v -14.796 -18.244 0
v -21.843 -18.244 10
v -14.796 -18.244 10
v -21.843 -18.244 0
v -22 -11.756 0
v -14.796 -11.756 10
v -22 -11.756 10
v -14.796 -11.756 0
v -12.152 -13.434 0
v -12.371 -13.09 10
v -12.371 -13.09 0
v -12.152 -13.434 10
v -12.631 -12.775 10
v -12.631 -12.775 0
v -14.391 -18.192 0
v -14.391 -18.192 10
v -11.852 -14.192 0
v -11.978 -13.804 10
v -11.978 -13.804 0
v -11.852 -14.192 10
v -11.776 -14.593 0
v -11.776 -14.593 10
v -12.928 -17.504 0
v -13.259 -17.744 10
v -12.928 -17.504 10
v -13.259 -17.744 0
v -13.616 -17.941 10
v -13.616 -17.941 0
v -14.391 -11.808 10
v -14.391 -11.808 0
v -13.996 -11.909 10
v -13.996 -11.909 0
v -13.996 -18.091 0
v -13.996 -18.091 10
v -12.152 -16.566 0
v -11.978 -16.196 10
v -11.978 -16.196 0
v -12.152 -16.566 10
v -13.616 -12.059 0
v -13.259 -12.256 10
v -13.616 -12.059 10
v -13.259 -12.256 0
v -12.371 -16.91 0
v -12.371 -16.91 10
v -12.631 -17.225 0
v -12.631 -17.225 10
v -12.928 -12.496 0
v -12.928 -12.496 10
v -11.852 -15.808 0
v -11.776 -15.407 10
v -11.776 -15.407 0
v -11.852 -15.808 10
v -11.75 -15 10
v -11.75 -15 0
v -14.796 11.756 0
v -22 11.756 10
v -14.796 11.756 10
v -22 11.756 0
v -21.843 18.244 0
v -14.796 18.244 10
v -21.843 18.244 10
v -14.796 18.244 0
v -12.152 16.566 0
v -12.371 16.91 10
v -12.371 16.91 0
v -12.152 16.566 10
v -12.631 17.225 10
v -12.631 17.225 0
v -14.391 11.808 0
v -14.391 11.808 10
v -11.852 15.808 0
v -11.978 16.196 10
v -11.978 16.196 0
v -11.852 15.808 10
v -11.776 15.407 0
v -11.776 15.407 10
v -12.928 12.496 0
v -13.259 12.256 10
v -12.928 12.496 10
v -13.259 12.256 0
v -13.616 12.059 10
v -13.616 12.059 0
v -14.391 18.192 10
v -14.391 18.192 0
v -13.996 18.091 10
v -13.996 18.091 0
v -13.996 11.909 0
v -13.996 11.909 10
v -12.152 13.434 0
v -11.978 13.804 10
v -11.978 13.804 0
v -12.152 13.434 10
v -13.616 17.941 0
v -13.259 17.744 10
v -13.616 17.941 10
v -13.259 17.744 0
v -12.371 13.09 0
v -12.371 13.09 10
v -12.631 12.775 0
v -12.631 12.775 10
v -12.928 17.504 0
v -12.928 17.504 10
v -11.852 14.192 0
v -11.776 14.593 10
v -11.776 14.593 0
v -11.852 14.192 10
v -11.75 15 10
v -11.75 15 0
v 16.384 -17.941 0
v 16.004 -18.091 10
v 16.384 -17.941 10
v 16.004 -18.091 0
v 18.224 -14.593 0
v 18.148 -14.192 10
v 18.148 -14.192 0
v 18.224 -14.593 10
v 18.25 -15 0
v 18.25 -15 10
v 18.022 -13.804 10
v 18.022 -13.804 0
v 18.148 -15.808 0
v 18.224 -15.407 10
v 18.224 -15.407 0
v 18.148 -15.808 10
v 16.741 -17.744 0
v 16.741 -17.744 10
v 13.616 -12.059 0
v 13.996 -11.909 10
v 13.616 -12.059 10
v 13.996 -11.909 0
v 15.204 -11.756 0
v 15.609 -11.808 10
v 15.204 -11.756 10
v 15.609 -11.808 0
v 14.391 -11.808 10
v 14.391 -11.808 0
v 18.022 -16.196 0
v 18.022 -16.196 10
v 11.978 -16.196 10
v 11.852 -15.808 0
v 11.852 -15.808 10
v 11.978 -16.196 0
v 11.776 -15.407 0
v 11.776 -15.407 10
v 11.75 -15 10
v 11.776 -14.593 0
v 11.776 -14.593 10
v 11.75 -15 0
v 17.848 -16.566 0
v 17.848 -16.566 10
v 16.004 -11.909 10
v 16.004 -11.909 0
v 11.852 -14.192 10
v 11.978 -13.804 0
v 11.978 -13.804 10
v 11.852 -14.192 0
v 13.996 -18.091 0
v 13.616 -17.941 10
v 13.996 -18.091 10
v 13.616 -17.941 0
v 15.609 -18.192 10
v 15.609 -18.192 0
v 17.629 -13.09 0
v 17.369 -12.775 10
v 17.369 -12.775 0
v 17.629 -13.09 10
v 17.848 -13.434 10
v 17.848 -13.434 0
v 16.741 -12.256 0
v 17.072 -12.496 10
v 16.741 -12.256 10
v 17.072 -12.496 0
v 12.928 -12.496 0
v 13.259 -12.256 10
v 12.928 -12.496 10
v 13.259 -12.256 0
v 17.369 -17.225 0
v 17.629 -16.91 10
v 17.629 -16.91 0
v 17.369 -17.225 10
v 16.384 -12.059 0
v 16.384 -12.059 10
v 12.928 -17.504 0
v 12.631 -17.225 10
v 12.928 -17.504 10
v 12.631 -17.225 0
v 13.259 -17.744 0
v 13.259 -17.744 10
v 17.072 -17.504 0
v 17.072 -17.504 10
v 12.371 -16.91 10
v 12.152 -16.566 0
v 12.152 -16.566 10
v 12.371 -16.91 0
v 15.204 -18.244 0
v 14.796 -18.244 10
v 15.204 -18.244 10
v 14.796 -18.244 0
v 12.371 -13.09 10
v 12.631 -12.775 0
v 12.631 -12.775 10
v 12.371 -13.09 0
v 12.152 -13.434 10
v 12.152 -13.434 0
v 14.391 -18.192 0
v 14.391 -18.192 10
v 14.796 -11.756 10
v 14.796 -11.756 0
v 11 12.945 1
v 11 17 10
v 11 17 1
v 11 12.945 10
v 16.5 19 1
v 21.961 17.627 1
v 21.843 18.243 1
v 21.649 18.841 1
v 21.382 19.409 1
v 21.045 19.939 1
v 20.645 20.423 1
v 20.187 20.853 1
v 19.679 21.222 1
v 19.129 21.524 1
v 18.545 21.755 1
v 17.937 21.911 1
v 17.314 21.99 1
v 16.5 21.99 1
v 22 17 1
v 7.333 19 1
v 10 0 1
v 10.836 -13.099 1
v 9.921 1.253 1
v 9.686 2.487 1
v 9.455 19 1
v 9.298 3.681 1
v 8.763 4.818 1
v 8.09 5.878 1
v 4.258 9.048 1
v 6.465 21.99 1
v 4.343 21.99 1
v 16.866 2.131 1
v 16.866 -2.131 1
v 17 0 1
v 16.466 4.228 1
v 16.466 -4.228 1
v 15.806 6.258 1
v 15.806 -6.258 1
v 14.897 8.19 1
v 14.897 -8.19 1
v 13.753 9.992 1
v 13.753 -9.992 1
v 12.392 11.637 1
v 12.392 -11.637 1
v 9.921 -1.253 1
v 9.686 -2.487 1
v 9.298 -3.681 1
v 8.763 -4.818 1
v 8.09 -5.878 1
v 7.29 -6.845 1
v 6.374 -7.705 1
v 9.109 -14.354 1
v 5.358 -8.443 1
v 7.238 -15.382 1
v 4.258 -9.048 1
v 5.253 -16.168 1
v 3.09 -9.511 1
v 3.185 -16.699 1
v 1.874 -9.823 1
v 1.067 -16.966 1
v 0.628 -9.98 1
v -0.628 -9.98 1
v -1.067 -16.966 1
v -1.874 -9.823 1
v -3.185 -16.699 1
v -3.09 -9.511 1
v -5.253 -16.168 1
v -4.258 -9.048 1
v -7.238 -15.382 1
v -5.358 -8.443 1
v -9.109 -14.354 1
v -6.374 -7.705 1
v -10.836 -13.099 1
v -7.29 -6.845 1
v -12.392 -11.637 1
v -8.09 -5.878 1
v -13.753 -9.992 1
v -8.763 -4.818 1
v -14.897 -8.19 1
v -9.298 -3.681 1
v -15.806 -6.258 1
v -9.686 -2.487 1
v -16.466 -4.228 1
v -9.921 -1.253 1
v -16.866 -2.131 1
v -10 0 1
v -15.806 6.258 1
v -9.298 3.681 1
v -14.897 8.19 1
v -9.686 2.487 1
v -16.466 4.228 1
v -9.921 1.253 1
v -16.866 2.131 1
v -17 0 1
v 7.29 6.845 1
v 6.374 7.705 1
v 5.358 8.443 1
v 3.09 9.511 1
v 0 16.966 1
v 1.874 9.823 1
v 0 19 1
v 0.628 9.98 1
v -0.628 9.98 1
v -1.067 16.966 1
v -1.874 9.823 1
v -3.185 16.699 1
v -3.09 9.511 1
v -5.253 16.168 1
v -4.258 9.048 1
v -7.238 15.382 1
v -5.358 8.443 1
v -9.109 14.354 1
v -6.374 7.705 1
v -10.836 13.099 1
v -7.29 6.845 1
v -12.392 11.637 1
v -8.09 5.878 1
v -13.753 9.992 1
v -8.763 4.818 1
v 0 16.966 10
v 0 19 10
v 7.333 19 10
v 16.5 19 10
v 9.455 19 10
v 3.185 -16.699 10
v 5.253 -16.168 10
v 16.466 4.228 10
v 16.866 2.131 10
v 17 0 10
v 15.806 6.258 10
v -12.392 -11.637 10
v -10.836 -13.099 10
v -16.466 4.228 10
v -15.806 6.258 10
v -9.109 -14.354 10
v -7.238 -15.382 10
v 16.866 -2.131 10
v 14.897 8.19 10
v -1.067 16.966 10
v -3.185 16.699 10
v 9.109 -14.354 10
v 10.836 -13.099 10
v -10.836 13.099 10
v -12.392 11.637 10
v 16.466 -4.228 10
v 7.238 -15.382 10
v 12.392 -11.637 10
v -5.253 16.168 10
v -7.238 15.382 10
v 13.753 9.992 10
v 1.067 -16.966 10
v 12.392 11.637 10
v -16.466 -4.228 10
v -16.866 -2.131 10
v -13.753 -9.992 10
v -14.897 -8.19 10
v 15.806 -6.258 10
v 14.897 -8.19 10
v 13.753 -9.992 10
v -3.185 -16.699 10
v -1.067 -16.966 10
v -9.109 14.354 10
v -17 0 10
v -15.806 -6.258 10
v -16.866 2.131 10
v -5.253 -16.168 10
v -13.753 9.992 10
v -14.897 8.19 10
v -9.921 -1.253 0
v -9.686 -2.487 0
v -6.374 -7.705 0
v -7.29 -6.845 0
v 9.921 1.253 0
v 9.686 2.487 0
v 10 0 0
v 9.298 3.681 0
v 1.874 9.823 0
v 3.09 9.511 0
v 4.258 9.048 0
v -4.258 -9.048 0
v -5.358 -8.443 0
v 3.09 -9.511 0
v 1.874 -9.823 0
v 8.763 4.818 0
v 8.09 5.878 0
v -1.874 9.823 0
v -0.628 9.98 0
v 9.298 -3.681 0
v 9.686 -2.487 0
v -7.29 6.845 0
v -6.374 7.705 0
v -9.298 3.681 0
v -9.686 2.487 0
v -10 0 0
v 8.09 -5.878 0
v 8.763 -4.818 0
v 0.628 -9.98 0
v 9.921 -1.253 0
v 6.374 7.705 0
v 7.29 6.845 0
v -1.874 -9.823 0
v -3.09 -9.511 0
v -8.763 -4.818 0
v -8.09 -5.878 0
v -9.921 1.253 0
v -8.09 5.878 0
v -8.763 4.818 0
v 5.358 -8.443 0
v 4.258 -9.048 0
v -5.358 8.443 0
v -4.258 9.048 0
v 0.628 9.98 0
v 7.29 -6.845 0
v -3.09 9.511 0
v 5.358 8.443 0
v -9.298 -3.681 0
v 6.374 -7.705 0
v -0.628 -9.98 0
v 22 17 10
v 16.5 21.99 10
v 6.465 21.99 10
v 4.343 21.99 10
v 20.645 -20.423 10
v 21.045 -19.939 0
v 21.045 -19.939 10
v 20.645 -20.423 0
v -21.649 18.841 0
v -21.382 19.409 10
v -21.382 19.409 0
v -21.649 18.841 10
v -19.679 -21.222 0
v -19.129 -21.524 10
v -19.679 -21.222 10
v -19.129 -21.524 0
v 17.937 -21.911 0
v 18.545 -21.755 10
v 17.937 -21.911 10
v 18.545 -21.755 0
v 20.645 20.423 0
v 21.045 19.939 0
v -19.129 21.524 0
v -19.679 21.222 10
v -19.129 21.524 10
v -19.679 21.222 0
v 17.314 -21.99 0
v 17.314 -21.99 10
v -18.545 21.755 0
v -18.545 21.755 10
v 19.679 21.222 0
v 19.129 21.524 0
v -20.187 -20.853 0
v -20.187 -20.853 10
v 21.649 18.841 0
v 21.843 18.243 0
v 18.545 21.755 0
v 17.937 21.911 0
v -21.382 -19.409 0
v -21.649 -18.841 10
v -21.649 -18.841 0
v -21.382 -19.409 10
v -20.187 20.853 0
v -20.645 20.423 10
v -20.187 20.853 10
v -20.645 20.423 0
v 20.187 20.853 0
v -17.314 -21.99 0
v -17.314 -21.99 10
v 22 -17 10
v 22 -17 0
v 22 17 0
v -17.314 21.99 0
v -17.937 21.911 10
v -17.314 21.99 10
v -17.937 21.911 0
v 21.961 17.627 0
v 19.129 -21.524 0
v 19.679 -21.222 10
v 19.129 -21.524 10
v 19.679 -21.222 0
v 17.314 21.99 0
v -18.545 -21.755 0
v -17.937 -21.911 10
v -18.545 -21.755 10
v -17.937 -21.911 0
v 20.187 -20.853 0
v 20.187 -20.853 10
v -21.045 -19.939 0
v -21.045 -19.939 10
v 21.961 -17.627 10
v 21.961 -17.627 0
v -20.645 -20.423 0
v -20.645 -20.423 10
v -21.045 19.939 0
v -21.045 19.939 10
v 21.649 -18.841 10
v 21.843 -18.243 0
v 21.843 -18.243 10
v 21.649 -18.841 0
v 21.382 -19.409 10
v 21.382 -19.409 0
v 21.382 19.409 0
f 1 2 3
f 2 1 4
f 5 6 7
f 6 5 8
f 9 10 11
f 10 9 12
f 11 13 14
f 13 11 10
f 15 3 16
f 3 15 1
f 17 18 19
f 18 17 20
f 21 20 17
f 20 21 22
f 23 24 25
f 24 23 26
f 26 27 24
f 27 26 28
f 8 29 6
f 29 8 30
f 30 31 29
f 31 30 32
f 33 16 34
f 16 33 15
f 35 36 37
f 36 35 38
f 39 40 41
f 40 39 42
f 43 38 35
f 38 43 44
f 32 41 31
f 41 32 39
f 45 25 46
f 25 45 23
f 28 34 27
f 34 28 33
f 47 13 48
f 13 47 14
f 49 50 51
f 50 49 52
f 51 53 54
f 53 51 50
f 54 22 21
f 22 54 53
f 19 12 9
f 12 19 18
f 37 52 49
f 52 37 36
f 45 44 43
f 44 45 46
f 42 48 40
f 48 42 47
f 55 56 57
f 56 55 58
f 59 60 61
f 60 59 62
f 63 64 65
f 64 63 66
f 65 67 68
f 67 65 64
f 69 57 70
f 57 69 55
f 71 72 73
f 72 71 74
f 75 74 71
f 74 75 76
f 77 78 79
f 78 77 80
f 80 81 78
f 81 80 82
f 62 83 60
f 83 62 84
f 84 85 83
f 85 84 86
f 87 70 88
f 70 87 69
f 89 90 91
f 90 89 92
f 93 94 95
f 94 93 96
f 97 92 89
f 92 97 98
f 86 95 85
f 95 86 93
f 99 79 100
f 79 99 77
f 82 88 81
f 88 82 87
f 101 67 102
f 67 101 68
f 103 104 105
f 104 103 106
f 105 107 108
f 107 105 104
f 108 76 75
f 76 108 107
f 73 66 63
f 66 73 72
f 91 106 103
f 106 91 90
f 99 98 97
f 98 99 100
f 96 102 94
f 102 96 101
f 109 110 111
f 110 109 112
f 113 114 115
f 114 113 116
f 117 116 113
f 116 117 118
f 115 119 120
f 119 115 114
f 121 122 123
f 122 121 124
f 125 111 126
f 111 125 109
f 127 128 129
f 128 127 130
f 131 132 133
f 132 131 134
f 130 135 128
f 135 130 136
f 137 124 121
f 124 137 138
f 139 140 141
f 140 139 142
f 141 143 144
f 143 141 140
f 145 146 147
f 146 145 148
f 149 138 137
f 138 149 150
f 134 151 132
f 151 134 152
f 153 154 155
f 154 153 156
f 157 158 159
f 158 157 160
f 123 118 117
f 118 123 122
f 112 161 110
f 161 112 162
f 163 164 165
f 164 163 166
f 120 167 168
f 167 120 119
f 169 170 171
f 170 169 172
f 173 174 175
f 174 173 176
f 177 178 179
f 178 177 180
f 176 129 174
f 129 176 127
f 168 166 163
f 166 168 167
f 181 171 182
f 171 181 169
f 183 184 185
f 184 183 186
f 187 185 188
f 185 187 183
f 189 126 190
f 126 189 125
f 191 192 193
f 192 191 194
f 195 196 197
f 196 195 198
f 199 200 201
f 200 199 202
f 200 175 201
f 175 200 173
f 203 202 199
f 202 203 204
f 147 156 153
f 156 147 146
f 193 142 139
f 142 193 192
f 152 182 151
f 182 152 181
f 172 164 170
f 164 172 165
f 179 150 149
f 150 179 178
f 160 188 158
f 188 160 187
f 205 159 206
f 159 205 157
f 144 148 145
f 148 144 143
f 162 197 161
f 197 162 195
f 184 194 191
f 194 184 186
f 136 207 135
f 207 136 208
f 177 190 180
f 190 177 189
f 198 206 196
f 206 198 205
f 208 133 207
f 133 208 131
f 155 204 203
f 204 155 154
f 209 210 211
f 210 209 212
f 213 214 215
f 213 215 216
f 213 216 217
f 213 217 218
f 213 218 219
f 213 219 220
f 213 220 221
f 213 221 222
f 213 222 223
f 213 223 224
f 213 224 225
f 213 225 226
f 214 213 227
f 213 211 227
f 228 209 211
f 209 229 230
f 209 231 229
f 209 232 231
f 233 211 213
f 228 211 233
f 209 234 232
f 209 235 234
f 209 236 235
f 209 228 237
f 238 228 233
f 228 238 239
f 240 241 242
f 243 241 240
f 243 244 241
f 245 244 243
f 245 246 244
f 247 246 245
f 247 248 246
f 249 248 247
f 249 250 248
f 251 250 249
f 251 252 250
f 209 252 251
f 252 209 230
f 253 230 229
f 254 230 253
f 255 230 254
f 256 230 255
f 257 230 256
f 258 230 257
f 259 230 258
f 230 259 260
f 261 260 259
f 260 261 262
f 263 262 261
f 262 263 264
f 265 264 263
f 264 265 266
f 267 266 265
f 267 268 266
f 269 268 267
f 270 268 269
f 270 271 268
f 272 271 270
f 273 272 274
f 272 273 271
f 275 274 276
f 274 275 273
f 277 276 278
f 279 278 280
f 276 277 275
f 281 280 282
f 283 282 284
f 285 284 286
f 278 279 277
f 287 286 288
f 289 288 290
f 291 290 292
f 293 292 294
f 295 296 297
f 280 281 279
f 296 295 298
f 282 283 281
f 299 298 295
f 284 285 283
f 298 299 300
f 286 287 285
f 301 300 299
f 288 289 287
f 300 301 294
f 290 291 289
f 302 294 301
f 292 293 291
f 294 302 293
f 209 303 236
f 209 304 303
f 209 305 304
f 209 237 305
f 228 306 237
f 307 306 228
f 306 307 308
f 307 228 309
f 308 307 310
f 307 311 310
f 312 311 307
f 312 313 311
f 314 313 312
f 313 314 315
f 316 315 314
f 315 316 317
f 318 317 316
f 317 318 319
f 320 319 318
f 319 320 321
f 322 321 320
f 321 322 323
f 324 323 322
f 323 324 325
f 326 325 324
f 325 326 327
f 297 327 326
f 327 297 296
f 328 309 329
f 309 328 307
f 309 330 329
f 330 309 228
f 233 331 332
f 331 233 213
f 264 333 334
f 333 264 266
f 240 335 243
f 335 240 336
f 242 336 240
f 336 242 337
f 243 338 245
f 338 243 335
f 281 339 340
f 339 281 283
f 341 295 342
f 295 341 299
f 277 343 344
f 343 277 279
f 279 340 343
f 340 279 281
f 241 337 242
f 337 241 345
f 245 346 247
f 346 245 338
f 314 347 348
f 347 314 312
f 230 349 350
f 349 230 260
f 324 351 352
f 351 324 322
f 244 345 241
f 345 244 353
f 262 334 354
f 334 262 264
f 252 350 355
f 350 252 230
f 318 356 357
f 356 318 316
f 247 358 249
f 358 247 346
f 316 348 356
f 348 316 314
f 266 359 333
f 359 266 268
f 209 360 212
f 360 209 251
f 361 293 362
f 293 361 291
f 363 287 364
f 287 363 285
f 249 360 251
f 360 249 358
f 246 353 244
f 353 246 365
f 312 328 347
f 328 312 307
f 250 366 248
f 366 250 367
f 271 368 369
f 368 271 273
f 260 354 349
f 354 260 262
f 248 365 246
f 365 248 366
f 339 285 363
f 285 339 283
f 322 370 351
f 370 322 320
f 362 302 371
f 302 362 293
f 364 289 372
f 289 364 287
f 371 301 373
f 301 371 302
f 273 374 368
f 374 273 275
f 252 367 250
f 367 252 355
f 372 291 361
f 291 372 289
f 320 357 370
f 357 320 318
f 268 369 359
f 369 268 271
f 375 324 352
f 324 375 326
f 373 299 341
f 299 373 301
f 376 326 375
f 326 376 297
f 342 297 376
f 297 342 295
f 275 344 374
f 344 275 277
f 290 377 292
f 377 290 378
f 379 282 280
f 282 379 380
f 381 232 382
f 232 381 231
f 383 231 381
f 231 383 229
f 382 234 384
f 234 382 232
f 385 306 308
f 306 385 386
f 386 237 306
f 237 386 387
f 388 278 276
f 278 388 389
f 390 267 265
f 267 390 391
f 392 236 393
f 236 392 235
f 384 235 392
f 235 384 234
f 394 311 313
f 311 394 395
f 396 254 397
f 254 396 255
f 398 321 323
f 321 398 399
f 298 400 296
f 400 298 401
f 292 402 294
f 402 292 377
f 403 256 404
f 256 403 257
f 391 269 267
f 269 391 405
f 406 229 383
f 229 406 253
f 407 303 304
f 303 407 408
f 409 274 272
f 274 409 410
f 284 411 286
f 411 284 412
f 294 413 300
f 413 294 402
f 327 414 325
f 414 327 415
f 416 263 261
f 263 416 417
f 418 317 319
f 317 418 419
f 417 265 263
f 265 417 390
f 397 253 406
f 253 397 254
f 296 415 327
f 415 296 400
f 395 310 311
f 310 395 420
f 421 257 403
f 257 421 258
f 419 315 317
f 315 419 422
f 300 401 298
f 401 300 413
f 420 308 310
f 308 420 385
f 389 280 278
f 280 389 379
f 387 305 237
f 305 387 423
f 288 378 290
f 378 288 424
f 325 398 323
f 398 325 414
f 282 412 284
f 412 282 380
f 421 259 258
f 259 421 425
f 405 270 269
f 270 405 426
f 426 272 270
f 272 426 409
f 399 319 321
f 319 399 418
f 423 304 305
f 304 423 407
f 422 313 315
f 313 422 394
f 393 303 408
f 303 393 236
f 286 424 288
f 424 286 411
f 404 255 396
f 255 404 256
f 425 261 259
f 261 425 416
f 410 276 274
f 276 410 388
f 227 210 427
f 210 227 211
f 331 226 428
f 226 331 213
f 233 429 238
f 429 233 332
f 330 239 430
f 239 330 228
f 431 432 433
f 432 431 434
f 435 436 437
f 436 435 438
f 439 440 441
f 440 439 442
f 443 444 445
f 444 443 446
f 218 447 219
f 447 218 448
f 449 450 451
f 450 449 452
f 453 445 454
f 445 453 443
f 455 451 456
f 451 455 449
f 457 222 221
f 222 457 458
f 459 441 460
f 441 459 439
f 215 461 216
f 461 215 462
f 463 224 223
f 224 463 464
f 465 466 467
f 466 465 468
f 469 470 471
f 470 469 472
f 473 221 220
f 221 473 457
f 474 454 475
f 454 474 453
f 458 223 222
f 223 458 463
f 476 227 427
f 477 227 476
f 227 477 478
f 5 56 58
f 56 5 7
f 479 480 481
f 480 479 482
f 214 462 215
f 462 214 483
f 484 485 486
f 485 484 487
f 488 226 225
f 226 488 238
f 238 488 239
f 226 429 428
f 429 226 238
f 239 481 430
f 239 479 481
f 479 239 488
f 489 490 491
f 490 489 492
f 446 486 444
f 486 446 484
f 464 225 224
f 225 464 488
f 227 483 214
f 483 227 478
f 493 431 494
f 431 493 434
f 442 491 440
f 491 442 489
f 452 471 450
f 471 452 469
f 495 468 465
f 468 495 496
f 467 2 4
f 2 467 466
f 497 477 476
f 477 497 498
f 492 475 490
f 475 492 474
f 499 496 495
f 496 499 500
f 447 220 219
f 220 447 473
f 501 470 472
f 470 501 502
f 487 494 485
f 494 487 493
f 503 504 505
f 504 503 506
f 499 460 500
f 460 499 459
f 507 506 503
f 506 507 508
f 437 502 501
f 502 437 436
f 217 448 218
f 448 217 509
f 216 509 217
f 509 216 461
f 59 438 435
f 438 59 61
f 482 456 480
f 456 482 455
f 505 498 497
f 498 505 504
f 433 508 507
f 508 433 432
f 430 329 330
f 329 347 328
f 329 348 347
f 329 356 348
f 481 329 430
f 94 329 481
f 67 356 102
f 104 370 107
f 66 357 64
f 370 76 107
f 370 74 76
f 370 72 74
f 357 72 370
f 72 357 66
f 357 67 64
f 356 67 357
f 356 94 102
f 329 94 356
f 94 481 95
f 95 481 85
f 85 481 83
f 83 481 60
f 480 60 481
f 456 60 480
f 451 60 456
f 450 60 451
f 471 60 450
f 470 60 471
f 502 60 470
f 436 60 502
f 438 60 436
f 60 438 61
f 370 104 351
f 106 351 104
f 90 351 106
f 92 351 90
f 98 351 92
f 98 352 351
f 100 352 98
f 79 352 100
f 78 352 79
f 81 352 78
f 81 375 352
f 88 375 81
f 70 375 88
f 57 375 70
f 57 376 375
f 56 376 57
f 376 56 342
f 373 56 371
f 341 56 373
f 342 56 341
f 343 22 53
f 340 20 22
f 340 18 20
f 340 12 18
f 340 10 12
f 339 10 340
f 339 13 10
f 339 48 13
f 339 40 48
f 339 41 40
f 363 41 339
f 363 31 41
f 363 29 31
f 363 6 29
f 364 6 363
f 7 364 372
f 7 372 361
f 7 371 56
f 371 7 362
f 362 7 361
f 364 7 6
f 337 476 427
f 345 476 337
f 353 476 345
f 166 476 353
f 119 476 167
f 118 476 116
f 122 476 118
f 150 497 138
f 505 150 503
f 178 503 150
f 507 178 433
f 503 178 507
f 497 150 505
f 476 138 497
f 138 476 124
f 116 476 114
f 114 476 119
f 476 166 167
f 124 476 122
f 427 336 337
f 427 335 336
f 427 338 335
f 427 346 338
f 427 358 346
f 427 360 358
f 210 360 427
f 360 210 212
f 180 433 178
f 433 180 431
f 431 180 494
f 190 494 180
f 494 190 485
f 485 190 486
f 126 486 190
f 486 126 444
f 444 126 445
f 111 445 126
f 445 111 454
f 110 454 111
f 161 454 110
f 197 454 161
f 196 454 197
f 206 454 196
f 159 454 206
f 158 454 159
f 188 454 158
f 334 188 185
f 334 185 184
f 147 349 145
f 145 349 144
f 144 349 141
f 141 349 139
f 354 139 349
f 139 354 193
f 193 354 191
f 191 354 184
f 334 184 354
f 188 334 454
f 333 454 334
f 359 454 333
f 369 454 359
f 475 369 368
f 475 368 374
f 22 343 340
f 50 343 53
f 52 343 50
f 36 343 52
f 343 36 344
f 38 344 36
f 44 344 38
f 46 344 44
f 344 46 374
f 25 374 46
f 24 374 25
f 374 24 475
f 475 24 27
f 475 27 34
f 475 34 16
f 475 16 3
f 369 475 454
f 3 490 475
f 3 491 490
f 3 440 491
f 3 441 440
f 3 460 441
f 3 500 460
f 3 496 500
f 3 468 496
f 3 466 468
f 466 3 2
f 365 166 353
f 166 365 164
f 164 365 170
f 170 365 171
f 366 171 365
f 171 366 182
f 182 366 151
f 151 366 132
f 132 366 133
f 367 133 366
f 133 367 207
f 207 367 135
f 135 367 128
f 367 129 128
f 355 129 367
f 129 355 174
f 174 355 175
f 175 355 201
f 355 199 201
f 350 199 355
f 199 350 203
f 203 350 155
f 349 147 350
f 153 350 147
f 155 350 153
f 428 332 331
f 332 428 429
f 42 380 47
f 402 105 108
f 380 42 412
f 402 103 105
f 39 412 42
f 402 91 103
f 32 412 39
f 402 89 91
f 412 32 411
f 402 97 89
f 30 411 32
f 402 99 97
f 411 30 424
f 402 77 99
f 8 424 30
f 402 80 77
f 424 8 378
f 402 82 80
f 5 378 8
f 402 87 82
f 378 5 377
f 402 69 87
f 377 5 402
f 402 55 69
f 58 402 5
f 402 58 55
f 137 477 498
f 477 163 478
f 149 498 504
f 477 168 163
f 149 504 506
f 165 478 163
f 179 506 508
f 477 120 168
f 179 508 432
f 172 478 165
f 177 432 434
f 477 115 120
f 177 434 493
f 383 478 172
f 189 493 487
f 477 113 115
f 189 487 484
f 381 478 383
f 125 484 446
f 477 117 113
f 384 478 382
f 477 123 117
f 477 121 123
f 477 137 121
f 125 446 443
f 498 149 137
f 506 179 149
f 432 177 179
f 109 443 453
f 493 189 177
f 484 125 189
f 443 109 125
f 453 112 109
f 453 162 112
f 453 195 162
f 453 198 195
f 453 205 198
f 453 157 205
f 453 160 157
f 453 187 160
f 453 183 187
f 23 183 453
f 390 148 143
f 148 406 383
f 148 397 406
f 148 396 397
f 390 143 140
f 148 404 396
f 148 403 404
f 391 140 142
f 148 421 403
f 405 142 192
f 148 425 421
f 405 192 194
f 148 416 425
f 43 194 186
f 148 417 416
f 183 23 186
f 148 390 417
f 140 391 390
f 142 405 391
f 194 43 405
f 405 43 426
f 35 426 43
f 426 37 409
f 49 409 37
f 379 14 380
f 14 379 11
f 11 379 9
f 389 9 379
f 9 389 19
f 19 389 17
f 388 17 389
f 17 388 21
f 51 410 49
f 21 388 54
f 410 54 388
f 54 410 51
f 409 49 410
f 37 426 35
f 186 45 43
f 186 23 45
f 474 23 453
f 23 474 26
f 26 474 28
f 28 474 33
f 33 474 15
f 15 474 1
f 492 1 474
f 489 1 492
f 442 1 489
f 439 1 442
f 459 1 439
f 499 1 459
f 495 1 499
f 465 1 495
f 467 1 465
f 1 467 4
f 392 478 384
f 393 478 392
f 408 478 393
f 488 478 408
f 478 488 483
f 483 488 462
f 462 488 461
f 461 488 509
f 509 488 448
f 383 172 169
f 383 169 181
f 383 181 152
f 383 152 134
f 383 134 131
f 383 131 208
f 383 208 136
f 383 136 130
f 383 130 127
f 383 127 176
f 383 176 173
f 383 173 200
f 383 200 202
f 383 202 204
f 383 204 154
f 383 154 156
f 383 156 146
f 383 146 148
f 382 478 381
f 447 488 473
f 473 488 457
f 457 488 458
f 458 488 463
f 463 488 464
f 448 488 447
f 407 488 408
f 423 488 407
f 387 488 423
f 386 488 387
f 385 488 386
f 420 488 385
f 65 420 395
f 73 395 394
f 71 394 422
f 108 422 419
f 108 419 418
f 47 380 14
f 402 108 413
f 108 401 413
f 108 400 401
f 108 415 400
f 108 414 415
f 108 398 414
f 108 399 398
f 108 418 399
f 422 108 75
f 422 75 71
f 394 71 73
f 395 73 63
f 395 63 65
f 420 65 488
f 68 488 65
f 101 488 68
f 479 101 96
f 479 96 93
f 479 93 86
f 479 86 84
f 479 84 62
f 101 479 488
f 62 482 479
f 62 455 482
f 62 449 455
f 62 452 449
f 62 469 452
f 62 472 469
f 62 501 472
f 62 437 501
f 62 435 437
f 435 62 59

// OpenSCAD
$fn = 50;


difference() {
	union() {
		translate(v = [0, 0, 0]) {
			rotate(a = [0, 0, 0]) {
				hull() {
					translate(v = [-17.0000000000, 17.0000000000, 0]) {
						rotate(a = [0, 0, 0]) {
							translate(v = [0, 0, 0]) {
								rotate(a = [0, 0, 0]) {
									cylinder(h = 10, r = 5);
								}
							}
						}
					}
					translate(v = [17.0000000000, 17.0000000000, 0]) {
						rotate(a = [0, 0, 0]) {
							translate(v = [0, 0, 0]) {
								rotate(a = [0, 0, 0]) {
									cylinder(h = 10, r = 5);
								}
							}
						}
					}
					translate(v = [-17.0000000000, -17.0000000000, 0]) {
						rotate(a = [0, 0, 0]) {
							translate(v = [0, 0, 0]) {
								rotate(a = [0, 0, 0]) {
									cylinder(h = 10, r = 5);
								}
							}
						}
					}
					translate(v = [17.0000000000, -17.0000000000, 0]) {
						rotate(a = [0, 0, 0]) {
							translate(v = [0, 0, 0]) {
								rotate(a = [0, 0, 0]) {
									cylinder(h = 10, r = 5);
								}
							}
						}
					}
				}
			}
		}
	}
	union() {
		translate(v = [-22.5000000000, -15.0000000000, -125]) {
			rotate(a = [0, 0, 0]) {
				hull() {
					translate(v = [7.5000000000, 0, 0]) {
						rotate(a = [0, 0, 0]) {
							translate(v = [0, 0, 0]) {
								rotate(a = [0, 0, 0]) {
									cylinder(h = 250, r = 3.2500000000);
								}
							}
						}
					}
					translate(v = [-7.5000000000, 0, 0]) {
						rotate(a = [0, 0, 0]) {
							translate(v = [0, 0, 0]) {
								rotate(a = [0, 0, 0]) {
									cylinder(h = 250, r = 3.2500000000);
								}
							}
						}
					}
				}
			}
		}
		translate(v = [-22.5000000000, 15.0000000000, -125]) {
			rotate(a = [0, 0, 0]) {
				hull() {
					translate(v = [7.5000000000, 0, 0]) {
						rotate(a = [0, 0, 0]) {
							translate(v = [0, 0, 0]) {
								rotate(a = [0, 0, 0]) {
									cylinder(h = 250, r = 3.2500000000);
								}
							}
						}
					}
					translate(v = [-7.5000000000, 0, 0]) {
						rotate(a = [0, 0, 0]) {
							translate(v = [0, 0, 0]) {
								rotate(a = [0, 0, 0]) {
									cylinder(h = 250, r = 3.2500000000);
								}
							}
						}
					}
				}
			}
		}
		translate(v = [15.0000000000, -15.0000000000, -125.0000000000]) {
			rotate(a = [0, 0, 0]) {
				cylinder(h = 250, r = 3.2500000000);
			}
		}
		translate(v = [0.0000000000, 11.0000000000, 1.0000000000]) {
			rotate(a = [0, 0, 0]) {
				cube(size = [11, 8, 12]);
			}
		}
		translate(v = [0, 0, 1.0000000000]) {
			rotate(a = [0, 0, 0]) {
				cylinder(h = 12, r = 17.0000000000);
			}
		}
		translate(v = [0, 0, -5.0000000000]) {
			rotate(a = [0, 0, 0]) {
				cylinder(h = 10, r = 10.0000000000);
			}
		}
		translate(v = [0.0000000000, 17.0000000000, 1]) {
			rotate(a = [0, 0, 0]) {
				cube(size = [22.0000000000, 2, 12]);
			}
		}
		translate(v = [16.5000000000, 17.0000000000, 1]) {
			rotate(a = [0, 0, 0]) {
				cube(size = [5.5000000000, 5, 12]);
			}
		}
		translate(v = [3.5833333333, 22.7500000000, 1]) {
			rotate(a = [0, 0, -45]) {
				cube(size = [7.5000000000, 1.5000000000, 12]);
			}
		}
	}
}
